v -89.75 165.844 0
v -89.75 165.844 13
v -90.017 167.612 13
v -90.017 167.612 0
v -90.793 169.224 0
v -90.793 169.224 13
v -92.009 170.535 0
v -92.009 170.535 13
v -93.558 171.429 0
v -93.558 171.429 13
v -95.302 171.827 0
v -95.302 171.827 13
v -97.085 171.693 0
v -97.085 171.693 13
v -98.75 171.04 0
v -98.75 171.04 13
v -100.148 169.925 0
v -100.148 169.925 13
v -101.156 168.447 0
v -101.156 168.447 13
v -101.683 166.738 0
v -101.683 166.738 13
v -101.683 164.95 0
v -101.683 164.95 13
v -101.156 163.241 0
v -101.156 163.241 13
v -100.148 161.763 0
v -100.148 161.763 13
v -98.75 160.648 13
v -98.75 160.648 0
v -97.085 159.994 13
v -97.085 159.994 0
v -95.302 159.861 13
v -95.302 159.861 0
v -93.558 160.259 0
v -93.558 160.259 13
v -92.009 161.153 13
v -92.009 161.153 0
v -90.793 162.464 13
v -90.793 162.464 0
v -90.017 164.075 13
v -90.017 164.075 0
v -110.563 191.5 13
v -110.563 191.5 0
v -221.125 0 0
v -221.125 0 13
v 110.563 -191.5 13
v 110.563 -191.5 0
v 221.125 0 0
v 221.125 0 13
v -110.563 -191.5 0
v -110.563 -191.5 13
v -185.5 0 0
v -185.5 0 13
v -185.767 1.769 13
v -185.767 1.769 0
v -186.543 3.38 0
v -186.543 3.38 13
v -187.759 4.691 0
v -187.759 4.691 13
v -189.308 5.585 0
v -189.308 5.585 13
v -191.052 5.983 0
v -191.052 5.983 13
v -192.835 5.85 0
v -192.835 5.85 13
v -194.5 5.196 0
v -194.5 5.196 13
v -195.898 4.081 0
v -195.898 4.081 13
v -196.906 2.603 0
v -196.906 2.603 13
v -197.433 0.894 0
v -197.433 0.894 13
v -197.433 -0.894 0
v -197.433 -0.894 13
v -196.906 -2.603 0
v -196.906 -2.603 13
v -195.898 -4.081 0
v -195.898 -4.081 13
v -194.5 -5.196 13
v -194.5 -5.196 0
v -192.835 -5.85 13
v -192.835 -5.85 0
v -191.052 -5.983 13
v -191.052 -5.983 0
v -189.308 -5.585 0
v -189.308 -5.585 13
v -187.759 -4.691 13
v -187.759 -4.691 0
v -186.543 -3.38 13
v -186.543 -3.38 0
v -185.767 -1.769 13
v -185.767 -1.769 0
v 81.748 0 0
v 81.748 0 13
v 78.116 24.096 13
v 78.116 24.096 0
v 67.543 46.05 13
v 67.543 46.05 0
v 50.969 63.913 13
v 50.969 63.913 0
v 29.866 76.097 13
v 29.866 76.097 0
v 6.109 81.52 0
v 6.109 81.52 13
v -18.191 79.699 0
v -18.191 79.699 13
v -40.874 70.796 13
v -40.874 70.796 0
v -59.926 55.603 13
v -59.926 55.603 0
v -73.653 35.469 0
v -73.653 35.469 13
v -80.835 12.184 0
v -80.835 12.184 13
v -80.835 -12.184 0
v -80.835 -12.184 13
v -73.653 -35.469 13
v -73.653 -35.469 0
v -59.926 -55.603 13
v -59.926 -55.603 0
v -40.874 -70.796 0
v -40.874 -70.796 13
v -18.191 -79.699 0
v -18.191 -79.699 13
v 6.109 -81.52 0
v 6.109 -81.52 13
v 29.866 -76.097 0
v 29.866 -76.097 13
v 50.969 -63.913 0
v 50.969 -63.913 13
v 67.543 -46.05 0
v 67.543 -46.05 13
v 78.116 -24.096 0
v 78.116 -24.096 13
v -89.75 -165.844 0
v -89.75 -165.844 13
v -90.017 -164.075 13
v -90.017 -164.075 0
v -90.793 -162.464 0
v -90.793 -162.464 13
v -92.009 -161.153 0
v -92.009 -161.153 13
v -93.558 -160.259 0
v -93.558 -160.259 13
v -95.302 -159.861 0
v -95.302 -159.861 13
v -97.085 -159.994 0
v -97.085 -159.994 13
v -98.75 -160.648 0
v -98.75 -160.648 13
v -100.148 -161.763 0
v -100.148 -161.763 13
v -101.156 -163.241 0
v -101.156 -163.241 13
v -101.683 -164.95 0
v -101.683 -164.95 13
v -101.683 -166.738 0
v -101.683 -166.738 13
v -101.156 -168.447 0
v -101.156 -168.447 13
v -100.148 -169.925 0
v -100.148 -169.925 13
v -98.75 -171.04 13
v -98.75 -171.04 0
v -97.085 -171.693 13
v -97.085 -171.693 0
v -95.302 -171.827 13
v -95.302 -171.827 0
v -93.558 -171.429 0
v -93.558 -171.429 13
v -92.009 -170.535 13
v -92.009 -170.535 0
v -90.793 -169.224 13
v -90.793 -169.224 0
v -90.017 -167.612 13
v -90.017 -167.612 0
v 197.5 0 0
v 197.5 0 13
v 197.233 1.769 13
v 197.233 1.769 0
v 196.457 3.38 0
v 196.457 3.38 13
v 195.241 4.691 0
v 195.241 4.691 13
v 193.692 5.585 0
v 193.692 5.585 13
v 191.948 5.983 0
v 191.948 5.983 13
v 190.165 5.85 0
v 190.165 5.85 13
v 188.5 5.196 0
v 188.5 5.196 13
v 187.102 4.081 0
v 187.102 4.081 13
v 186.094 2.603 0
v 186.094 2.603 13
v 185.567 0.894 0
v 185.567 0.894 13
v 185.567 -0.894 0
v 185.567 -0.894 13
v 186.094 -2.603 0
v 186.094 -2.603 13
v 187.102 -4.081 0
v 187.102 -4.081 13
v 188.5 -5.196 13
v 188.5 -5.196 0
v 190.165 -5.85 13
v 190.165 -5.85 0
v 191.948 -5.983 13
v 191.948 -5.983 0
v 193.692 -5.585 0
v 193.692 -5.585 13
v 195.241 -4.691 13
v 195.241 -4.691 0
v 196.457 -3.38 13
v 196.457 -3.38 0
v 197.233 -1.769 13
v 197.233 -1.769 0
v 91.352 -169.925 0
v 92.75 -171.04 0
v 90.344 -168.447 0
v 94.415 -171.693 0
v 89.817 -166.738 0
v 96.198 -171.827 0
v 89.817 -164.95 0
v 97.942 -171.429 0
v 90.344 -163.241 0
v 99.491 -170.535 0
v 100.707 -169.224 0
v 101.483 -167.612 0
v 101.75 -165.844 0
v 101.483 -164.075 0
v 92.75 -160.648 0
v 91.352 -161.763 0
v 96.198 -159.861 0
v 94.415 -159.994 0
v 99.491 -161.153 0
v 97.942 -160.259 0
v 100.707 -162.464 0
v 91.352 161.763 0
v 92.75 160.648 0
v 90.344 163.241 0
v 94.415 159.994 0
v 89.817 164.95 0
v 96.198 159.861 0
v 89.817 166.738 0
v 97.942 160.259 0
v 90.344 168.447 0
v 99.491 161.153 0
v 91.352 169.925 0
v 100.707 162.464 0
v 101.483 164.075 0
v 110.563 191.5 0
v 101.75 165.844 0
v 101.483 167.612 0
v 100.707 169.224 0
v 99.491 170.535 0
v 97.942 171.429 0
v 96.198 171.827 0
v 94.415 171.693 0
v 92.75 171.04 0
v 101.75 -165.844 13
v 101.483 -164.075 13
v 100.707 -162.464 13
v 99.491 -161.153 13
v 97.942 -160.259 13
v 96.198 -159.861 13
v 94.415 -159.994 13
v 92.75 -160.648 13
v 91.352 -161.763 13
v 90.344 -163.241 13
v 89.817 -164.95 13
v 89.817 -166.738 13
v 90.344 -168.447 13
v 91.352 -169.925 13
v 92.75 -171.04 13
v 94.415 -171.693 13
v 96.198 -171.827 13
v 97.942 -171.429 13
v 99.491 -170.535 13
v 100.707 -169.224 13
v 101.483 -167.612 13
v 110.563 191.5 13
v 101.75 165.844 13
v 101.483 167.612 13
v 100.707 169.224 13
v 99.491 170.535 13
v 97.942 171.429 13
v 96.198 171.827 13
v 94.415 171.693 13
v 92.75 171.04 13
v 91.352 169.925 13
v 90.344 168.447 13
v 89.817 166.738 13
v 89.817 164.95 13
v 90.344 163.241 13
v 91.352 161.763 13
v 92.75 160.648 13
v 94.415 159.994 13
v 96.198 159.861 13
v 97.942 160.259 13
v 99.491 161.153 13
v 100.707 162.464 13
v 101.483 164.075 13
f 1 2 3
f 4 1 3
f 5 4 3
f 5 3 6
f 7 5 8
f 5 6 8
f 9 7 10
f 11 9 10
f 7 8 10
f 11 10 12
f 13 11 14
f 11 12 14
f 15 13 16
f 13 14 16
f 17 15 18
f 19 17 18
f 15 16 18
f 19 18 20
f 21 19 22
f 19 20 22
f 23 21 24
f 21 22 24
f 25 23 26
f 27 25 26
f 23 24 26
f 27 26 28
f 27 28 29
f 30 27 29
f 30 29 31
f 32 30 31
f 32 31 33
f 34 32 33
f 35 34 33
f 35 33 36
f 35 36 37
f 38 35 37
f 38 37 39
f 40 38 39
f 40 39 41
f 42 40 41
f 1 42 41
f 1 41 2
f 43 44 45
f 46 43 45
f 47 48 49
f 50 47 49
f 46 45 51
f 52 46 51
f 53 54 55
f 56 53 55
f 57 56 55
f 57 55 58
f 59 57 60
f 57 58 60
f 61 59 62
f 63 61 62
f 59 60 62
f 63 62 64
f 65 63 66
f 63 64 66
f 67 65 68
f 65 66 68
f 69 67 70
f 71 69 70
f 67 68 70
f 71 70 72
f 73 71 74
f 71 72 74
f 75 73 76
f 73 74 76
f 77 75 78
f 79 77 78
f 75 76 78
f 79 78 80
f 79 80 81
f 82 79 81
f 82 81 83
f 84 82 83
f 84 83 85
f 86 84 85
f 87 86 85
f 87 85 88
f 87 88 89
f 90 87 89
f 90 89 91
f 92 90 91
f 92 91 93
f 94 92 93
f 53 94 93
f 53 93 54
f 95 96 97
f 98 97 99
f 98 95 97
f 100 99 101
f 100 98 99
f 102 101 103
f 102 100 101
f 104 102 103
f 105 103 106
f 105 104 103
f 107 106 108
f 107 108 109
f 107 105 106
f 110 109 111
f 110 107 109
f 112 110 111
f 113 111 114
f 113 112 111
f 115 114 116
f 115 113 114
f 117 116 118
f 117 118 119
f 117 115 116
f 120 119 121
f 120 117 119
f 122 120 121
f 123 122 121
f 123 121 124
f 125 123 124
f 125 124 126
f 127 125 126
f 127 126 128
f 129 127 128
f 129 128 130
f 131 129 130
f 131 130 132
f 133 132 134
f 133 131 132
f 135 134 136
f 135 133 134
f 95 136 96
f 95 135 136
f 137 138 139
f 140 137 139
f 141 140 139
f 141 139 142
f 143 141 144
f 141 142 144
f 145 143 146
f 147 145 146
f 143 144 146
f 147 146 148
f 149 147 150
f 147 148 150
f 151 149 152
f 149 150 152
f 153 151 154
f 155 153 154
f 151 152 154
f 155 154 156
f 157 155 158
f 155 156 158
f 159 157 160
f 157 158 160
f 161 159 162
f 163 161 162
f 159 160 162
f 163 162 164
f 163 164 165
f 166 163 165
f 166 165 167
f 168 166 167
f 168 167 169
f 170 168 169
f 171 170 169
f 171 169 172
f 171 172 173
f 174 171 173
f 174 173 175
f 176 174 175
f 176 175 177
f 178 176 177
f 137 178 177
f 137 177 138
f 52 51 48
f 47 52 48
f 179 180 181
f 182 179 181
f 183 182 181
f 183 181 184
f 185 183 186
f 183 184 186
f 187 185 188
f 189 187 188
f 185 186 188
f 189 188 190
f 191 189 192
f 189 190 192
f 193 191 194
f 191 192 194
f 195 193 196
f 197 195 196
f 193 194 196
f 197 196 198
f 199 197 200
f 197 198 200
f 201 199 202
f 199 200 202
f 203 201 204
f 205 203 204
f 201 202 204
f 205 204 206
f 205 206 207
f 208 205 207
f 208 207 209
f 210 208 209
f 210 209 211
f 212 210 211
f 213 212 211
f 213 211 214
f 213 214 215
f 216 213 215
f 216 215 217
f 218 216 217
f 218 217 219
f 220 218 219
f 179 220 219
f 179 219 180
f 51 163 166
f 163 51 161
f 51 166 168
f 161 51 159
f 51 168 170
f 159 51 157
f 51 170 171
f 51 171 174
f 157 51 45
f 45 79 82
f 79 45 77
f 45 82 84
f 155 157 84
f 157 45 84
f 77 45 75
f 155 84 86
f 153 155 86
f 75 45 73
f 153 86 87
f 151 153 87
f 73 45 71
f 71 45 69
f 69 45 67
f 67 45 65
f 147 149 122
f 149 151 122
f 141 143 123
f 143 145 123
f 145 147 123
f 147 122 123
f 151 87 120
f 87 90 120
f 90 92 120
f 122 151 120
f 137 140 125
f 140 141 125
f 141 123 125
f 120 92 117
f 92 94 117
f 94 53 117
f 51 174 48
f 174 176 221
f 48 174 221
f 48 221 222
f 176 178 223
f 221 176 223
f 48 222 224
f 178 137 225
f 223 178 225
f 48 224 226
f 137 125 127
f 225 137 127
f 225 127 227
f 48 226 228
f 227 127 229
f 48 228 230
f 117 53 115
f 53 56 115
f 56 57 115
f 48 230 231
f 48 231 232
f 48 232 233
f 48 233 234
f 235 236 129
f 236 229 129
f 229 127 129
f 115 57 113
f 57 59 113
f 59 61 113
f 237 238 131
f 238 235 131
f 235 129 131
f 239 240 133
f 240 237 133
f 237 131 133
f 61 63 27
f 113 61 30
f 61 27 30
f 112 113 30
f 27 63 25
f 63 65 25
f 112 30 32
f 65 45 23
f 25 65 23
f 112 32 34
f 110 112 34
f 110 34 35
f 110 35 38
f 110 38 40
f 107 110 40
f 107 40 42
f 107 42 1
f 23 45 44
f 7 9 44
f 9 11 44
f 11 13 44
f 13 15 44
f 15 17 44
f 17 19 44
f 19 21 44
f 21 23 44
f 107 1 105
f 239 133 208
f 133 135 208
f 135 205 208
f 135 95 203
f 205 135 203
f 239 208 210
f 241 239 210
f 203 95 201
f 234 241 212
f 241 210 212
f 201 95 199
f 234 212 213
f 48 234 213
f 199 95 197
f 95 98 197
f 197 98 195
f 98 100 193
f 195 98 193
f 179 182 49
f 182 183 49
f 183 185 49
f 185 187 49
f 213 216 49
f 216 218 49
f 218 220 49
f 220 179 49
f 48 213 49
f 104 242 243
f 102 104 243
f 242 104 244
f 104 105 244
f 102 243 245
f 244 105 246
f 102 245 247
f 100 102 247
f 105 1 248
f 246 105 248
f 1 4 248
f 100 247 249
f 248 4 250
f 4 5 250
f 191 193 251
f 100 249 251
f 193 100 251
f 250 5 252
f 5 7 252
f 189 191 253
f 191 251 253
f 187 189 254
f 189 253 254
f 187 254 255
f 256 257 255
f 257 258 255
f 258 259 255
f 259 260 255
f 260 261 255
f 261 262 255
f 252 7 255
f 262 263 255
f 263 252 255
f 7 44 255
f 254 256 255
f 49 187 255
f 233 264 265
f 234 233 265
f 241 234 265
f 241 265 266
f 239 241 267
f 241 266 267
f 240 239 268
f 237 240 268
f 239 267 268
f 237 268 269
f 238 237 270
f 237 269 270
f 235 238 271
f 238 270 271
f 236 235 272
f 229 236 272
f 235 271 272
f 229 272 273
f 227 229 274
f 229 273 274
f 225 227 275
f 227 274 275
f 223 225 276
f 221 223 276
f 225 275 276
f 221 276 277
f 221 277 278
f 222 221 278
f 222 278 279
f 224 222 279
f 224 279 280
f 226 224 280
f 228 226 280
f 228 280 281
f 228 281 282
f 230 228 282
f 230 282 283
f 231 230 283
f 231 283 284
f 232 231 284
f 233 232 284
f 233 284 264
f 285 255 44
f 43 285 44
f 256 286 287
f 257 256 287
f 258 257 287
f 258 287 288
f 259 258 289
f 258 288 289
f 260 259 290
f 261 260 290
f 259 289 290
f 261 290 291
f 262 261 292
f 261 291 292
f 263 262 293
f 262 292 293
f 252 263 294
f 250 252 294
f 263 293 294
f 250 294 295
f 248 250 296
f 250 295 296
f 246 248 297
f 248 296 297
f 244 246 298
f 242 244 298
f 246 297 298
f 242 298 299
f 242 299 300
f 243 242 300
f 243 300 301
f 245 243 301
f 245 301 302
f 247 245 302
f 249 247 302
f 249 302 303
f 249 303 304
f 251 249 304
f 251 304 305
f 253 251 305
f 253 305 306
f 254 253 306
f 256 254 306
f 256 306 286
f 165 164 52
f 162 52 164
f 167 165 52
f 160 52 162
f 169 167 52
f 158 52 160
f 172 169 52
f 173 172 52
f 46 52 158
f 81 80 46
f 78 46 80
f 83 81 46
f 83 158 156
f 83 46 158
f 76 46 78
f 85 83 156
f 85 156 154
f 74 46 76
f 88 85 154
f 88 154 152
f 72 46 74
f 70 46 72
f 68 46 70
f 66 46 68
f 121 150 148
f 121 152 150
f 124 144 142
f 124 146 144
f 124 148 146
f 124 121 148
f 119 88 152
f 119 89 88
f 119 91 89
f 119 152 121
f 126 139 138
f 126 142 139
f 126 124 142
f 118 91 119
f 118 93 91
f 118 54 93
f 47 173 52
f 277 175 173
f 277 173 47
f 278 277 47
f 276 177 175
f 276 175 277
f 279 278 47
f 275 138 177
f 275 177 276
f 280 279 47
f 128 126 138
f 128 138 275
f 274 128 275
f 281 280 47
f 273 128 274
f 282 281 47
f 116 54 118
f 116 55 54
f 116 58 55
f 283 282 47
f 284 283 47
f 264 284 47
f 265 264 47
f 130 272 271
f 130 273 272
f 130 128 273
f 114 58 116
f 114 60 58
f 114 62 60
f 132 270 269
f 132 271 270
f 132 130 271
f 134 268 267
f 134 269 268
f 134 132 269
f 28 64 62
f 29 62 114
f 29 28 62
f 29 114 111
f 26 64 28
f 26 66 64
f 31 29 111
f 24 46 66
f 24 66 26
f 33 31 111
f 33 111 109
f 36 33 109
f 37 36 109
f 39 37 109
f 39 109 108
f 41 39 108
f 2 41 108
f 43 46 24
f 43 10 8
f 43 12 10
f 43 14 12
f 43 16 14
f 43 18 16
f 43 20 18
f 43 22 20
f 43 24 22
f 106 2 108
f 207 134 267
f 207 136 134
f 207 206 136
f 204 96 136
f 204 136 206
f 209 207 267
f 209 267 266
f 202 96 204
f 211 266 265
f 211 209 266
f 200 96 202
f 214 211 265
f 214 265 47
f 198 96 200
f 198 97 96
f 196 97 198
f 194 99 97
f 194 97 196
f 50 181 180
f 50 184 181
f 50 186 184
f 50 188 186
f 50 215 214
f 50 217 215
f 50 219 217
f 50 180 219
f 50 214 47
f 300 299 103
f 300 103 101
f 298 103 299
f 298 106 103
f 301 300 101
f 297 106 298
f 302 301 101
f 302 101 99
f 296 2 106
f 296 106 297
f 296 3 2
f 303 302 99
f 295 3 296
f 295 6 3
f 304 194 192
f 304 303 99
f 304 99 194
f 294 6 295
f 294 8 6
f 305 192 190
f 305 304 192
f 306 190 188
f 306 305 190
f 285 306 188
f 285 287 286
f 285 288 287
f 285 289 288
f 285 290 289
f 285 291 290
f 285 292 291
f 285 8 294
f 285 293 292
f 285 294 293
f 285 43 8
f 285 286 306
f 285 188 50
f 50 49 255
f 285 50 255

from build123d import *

# Parameters (mm, degrees)
SKETCH_R        = 81.748116
PAD_DEPTH       = 13
SKETCH001_R     = 6
POCKET_DEPTH    = 13.001
SKETCH002_R     = 6
POCKET001_DEPTH = 13.001


with BuildPart() as part:
    # Sketch → Pad (new body)
    with BuildSketch(Plane.XY):
        Polygon((110.562577, 191.5), (-110.562577, 191.5), (-221.125153, 0), (-110.562577, -191.5), (110.562577, -191.5), (221.125153, 0), align=None)
        Circle(SKETCH_R, mode=Mode.SUBTRACT)
    extrude(amount=PAD_DEPTH)

    # Sketch001 (on Face9 of Pad) → Pocket (cut, through all)
    with BuildSketch(Plane.XY.offset(13)):
        with Locations((95.75, 165.843865)):
            Circle(SKETCH001_R)
        with Locations((-95.75, 165.843865)):
            Circle(SKETCH001_R)
        with Locations((-95.75, -165.843865)):
            Circle(SKETCH001_R)
        with Locations((95.75, -165.843865)):
            Circle(SKETCH001_R)
    extrude(amount=-POCKET_DEPTH, mode=Mode.SUBTRACT)

    # Sketch002 (on Face5 of Pocket) → Pocket001 (cut, through all)
    with BuildSketch(Plane.XY.offset(13)):
        with Locations((-191.5, 0)):
            Circle(SKETCH002_R)
        with Locations((191.5, 0)):
            Circle(SKETCH002_R)
    extrude(amount=-POCKET001_DEPTH, mode=Mode.SUBTRACT)


solid = part.part
